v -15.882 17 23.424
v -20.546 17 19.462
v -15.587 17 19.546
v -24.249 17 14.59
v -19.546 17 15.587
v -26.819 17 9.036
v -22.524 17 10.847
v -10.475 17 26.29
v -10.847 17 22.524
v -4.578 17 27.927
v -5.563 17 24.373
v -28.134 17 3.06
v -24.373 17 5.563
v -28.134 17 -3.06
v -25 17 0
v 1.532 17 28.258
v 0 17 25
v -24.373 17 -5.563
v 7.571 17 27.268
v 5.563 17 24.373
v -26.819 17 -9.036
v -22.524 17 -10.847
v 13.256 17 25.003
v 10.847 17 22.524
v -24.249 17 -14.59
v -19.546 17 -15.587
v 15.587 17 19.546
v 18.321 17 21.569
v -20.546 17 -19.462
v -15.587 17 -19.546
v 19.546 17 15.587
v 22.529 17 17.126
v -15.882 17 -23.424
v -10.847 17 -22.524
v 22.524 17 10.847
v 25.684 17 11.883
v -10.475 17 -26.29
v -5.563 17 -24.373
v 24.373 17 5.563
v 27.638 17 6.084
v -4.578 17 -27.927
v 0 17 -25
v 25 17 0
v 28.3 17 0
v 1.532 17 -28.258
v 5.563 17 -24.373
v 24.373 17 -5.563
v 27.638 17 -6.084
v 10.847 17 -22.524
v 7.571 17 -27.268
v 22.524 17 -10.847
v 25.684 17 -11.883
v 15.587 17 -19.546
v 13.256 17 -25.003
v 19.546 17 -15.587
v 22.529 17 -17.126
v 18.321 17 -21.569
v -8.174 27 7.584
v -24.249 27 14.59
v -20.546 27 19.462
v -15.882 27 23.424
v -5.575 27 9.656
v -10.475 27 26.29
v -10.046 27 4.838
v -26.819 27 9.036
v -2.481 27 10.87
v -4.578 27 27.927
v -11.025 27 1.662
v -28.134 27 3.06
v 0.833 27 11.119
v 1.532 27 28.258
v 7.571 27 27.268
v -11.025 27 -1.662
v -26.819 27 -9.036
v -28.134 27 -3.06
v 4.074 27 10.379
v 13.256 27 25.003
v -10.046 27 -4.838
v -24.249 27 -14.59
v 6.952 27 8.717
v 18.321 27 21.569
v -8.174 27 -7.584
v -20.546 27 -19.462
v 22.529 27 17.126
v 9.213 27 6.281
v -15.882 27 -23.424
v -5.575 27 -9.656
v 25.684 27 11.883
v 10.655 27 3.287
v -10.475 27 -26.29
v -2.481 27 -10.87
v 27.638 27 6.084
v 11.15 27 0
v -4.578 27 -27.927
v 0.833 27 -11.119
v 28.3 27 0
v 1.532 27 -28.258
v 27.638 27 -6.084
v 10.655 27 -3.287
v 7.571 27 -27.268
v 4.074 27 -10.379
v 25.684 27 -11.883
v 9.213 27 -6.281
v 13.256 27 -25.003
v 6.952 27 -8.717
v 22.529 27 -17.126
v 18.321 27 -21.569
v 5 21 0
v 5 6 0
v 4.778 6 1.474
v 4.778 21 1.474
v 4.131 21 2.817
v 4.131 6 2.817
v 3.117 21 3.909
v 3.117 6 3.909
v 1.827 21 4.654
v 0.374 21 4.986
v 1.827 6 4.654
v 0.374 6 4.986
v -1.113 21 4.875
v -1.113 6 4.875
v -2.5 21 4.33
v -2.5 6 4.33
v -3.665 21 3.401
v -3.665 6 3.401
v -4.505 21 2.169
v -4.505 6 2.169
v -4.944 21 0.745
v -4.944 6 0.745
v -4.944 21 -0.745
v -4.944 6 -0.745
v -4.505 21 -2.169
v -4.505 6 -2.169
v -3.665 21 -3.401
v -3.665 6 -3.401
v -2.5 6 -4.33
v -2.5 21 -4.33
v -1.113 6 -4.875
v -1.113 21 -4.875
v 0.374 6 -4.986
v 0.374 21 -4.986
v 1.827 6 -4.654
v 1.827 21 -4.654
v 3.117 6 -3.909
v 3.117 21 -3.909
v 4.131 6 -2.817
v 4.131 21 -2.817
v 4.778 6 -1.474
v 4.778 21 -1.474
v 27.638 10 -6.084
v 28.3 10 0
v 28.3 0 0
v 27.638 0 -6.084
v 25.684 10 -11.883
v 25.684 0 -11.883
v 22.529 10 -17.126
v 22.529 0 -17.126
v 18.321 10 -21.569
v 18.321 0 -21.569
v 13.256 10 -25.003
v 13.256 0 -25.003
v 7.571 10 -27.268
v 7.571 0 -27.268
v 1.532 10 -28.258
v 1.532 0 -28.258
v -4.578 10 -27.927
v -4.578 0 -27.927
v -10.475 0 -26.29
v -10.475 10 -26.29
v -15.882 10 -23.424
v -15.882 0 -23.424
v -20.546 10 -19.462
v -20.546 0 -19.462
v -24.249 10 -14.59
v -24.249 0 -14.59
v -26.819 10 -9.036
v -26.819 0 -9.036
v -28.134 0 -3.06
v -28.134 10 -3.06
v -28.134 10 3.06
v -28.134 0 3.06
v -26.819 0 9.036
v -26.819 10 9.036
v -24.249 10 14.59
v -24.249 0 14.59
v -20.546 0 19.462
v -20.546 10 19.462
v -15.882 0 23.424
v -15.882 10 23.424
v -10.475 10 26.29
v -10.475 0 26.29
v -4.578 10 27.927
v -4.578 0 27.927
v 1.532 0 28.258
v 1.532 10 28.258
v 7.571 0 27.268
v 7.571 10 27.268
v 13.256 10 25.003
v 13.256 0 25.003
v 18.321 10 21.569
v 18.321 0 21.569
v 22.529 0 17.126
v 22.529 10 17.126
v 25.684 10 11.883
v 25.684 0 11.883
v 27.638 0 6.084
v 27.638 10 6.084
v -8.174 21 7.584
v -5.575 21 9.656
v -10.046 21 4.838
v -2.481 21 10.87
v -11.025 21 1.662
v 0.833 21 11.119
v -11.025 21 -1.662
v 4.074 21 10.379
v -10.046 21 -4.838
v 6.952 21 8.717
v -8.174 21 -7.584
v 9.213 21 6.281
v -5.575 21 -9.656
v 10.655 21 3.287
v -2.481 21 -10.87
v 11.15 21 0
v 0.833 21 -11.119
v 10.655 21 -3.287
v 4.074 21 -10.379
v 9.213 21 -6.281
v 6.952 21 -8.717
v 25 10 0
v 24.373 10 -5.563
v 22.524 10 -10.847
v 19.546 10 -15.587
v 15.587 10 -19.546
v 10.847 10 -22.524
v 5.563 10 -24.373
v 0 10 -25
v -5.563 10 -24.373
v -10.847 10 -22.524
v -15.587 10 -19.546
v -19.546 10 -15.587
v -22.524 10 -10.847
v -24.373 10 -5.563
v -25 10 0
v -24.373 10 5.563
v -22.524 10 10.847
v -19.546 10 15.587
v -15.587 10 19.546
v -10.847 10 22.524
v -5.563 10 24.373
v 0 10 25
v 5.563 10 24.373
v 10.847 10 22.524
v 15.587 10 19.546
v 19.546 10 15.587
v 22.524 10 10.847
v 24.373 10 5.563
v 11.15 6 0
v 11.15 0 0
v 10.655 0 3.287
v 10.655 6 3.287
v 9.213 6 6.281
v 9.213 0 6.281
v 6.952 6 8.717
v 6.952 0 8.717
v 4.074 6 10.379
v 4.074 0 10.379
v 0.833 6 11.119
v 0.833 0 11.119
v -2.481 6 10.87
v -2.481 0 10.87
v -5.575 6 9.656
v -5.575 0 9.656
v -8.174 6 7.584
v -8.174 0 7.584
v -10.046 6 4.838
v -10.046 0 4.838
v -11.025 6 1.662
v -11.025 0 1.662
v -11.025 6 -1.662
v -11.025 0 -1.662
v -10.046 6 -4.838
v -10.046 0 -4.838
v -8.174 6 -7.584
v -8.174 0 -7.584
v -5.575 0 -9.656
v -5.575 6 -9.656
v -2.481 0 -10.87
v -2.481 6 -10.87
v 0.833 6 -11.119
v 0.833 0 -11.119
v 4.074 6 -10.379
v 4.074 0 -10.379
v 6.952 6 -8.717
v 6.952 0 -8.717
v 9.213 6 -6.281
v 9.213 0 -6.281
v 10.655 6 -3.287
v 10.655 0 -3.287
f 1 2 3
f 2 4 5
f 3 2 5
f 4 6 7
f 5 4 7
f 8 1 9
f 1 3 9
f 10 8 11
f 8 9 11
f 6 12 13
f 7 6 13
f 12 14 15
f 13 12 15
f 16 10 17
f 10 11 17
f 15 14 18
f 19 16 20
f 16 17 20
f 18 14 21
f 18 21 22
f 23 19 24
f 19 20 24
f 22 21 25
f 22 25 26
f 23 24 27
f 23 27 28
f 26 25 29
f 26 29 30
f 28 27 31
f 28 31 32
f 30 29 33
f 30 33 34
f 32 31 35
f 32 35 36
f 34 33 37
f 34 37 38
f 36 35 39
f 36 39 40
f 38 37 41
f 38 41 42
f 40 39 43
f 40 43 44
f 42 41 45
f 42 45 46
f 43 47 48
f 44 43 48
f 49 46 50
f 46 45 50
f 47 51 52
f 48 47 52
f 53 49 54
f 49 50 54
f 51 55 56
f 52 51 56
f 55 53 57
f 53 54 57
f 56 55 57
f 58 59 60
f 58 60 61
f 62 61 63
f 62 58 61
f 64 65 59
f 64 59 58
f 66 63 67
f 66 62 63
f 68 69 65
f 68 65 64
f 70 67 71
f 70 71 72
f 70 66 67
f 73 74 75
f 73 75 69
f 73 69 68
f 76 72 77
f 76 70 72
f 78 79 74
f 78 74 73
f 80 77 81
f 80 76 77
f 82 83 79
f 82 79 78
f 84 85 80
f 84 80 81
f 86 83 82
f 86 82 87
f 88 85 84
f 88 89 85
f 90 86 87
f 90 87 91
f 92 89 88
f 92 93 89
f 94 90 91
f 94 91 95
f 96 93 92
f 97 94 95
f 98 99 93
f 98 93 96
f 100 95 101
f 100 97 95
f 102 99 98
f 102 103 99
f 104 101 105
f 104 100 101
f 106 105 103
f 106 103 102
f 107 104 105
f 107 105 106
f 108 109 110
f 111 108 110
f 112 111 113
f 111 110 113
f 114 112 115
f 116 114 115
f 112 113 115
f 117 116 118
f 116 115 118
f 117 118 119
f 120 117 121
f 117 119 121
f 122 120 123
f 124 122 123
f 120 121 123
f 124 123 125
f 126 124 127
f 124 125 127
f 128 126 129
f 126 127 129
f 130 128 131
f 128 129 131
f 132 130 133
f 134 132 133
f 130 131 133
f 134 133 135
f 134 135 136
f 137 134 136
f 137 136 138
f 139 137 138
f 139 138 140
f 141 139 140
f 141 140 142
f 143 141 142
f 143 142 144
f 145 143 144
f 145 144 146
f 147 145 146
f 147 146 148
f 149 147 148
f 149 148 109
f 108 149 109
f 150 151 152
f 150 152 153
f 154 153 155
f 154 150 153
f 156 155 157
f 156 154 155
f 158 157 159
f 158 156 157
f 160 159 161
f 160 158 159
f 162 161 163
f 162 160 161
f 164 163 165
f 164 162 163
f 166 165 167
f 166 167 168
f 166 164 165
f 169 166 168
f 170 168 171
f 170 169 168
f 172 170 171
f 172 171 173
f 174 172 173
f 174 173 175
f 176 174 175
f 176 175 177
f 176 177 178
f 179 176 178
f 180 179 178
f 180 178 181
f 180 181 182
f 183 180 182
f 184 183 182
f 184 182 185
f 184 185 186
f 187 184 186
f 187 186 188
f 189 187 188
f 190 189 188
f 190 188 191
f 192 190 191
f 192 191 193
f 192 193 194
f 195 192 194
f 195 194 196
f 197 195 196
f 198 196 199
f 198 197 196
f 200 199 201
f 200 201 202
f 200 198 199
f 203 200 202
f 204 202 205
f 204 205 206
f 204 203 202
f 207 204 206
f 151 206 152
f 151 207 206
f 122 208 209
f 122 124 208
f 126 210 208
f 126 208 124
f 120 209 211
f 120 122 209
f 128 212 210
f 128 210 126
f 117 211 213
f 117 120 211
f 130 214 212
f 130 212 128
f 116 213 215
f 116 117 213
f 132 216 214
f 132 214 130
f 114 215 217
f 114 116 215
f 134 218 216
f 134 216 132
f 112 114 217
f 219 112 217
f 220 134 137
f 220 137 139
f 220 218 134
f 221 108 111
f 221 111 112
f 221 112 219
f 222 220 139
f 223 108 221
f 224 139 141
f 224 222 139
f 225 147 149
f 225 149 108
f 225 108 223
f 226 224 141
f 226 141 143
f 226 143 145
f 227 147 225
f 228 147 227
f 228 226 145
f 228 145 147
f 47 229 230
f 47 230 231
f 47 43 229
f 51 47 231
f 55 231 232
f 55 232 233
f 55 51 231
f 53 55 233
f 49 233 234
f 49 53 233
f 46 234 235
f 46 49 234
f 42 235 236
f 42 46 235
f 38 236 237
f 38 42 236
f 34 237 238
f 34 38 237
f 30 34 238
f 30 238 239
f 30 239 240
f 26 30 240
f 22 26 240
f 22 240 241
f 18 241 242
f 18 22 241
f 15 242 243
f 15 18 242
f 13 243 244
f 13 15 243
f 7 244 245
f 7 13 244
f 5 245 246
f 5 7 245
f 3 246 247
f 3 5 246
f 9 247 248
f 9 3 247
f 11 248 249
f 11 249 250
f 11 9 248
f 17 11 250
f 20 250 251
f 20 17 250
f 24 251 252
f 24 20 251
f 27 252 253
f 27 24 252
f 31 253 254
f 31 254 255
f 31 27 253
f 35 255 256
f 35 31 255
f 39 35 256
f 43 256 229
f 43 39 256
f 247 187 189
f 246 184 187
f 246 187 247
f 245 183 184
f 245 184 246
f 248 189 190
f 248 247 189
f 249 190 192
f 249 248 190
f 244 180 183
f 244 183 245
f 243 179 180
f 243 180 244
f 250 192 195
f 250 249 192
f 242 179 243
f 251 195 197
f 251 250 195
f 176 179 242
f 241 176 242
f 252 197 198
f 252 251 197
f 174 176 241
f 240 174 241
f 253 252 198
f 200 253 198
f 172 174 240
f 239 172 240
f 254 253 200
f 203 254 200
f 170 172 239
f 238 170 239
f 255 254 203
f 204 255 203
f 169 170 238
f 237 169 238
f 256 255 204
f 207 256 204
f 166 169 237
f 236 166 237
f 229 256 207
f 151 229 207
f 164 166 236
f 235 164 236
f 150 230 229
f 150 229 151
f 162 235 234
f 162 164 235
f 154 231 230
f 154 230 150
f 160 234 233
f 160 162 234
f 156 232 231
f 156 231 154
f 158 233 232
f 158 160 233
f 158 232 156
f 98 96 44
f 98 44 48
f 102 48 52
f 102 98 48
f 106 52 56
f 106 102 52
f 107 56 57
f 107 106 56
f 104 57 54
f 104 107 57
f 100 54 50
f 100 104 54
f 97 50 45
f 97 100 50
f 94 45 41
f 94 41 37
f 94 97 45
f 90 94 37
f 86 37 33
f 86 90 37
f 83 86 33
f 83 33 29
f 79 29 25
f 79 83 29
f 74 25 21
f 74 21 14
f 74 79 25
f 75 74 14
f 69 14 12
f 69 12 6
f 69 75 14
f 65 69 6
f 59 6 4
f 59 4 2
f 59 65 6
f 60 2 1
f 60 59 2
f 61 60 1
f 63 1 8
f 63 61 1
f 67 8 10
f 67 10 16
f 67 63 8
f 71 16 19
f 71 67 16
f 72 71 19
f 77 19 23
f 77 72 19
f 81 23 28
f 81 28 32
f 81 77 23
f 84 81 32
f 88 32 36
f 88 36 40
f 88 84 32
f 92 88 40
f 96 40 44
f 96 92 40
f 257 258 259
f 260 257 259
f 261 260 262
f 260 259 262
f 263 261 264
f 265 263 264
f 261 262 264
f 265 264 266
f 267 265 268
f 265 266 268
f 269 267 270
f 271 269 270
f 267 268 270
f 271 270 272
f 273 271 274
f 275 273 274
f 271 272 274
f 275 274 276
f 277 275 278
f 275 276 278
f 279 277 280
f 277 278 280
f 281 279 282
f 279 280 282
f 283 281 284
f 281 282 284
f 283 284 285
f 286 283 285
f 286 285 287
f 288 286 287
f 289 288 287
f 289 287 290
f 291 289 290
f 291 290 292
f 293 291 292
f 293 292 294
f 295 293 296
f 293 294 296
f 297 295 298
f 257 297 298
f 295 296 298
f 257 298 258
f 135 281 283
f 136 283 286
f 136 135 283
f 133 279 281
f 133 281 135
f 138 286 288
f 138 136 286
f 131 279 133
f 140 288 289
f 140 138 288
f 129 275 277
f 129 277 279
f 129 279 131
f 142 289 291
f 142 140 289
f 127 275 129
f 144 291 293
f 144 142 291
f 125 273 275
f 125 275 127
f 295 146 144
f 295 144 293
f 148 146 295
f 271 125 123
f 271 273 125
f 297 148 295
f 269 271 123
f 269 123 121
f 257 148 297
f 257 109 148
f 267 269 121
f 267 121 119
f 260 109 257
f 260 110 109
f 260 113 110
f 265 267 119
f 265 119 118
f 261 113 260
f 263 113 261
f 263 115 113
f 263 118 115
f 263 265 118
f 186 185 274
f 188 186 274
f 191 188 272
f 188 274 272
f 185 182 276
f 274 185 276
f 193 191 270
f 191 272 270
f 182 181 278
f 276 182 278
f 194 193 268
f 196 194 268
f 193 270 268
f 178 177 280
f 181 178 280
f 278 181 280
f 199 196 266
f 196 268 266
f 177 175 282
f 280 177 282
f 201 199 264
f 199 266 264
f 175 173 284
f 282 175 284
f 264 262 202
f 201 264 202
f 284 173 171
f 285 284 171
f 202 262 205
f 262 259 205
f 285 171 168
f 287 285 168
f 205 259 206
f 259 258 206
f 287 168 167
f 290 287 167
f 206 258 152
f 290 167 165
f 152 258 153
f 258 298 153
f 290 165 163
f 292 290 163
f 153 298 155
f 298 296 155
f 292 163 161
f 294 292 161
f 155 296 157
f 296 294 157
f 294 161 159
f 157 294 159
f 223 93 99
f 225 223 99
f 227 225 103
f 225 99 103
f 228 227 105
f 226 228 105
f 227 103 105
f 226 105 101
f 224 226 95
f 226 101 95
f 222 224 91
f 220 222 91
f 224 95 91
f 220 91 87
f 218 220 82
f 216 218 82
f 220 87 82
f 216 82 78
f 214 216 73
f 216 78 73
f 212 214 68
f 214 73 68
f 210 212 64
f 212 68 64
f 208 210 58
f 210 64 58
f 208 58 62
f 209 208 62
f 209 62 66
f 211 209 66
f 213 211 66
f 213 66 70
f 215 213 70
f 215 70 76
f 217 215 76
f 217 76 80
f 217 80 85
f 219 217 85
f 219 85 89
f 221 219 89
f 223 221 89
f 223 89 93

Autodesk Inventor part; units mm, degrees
ref_plane "YZ Plane" through (0, 0, 0) normal (1, 0, 0) x (0, 1, 0)
ref_plane "XZ Plane" through (0, 0, 0) normal (0, 1, 0) x (-1, 0, 0)
ref_plane "XY Plane" through (0, 0, 0) normal (0, 0, 1) x (1, 0, 0)
sketch "Sketch1" plane through (0, 0, 0) normal (0, 0, 1) x (1, 0, 0)
  line L0 (0, 0) -> (0, 20.9396) construction
  line L1 (5, 0) -> (28.3, 0)
  line L2 (28.3, 0) -> (28.3, 10)
  line L3 (28.3, 10) -> (25, 10)
  line L4 (25, 10) -> (25, 17)
  line L5 (25, 17) -> (28.3, 17)
  line L6 (28.3, 17) -> (28.3, 27)
  line L7 (28.3, 27) -> (5, 27)
  line L8 (5, 27) -> (5, 0)
  dimension "d1" = 3.3
  dimension "d2" = 7
  dimension "d4" = 10
  dimension "d15" = 25
  dimension "d16" = 5
revolve "Revolution1" add sketch "Sketch1" angle 360 about axis through (0, 0, 0) along (0, 1, 0)
sketch "Sketch2" plane through (0, 27, 0) normal (0, 1, 0) x (1, 0, 0)
  circle A0 centre (0, 0) radius 11.15
  dimension "d8" = 22.3
extrude "Extrusion1" cut sketch "Sketch2" against normal blind 6
sketch "Sketch3" plane through (0, 0, 0) normal (0, -1, 0) x (1, 0, 0)
  circle A0 centre (0, 0) radius 11.15
  dimension "d11" = 22.3
extrude "Extrusion2" cut sketch "Sketch3" against normal blind 6
properties part number "1213_Distal Roller_V1" material "Acetal Resin, White"
